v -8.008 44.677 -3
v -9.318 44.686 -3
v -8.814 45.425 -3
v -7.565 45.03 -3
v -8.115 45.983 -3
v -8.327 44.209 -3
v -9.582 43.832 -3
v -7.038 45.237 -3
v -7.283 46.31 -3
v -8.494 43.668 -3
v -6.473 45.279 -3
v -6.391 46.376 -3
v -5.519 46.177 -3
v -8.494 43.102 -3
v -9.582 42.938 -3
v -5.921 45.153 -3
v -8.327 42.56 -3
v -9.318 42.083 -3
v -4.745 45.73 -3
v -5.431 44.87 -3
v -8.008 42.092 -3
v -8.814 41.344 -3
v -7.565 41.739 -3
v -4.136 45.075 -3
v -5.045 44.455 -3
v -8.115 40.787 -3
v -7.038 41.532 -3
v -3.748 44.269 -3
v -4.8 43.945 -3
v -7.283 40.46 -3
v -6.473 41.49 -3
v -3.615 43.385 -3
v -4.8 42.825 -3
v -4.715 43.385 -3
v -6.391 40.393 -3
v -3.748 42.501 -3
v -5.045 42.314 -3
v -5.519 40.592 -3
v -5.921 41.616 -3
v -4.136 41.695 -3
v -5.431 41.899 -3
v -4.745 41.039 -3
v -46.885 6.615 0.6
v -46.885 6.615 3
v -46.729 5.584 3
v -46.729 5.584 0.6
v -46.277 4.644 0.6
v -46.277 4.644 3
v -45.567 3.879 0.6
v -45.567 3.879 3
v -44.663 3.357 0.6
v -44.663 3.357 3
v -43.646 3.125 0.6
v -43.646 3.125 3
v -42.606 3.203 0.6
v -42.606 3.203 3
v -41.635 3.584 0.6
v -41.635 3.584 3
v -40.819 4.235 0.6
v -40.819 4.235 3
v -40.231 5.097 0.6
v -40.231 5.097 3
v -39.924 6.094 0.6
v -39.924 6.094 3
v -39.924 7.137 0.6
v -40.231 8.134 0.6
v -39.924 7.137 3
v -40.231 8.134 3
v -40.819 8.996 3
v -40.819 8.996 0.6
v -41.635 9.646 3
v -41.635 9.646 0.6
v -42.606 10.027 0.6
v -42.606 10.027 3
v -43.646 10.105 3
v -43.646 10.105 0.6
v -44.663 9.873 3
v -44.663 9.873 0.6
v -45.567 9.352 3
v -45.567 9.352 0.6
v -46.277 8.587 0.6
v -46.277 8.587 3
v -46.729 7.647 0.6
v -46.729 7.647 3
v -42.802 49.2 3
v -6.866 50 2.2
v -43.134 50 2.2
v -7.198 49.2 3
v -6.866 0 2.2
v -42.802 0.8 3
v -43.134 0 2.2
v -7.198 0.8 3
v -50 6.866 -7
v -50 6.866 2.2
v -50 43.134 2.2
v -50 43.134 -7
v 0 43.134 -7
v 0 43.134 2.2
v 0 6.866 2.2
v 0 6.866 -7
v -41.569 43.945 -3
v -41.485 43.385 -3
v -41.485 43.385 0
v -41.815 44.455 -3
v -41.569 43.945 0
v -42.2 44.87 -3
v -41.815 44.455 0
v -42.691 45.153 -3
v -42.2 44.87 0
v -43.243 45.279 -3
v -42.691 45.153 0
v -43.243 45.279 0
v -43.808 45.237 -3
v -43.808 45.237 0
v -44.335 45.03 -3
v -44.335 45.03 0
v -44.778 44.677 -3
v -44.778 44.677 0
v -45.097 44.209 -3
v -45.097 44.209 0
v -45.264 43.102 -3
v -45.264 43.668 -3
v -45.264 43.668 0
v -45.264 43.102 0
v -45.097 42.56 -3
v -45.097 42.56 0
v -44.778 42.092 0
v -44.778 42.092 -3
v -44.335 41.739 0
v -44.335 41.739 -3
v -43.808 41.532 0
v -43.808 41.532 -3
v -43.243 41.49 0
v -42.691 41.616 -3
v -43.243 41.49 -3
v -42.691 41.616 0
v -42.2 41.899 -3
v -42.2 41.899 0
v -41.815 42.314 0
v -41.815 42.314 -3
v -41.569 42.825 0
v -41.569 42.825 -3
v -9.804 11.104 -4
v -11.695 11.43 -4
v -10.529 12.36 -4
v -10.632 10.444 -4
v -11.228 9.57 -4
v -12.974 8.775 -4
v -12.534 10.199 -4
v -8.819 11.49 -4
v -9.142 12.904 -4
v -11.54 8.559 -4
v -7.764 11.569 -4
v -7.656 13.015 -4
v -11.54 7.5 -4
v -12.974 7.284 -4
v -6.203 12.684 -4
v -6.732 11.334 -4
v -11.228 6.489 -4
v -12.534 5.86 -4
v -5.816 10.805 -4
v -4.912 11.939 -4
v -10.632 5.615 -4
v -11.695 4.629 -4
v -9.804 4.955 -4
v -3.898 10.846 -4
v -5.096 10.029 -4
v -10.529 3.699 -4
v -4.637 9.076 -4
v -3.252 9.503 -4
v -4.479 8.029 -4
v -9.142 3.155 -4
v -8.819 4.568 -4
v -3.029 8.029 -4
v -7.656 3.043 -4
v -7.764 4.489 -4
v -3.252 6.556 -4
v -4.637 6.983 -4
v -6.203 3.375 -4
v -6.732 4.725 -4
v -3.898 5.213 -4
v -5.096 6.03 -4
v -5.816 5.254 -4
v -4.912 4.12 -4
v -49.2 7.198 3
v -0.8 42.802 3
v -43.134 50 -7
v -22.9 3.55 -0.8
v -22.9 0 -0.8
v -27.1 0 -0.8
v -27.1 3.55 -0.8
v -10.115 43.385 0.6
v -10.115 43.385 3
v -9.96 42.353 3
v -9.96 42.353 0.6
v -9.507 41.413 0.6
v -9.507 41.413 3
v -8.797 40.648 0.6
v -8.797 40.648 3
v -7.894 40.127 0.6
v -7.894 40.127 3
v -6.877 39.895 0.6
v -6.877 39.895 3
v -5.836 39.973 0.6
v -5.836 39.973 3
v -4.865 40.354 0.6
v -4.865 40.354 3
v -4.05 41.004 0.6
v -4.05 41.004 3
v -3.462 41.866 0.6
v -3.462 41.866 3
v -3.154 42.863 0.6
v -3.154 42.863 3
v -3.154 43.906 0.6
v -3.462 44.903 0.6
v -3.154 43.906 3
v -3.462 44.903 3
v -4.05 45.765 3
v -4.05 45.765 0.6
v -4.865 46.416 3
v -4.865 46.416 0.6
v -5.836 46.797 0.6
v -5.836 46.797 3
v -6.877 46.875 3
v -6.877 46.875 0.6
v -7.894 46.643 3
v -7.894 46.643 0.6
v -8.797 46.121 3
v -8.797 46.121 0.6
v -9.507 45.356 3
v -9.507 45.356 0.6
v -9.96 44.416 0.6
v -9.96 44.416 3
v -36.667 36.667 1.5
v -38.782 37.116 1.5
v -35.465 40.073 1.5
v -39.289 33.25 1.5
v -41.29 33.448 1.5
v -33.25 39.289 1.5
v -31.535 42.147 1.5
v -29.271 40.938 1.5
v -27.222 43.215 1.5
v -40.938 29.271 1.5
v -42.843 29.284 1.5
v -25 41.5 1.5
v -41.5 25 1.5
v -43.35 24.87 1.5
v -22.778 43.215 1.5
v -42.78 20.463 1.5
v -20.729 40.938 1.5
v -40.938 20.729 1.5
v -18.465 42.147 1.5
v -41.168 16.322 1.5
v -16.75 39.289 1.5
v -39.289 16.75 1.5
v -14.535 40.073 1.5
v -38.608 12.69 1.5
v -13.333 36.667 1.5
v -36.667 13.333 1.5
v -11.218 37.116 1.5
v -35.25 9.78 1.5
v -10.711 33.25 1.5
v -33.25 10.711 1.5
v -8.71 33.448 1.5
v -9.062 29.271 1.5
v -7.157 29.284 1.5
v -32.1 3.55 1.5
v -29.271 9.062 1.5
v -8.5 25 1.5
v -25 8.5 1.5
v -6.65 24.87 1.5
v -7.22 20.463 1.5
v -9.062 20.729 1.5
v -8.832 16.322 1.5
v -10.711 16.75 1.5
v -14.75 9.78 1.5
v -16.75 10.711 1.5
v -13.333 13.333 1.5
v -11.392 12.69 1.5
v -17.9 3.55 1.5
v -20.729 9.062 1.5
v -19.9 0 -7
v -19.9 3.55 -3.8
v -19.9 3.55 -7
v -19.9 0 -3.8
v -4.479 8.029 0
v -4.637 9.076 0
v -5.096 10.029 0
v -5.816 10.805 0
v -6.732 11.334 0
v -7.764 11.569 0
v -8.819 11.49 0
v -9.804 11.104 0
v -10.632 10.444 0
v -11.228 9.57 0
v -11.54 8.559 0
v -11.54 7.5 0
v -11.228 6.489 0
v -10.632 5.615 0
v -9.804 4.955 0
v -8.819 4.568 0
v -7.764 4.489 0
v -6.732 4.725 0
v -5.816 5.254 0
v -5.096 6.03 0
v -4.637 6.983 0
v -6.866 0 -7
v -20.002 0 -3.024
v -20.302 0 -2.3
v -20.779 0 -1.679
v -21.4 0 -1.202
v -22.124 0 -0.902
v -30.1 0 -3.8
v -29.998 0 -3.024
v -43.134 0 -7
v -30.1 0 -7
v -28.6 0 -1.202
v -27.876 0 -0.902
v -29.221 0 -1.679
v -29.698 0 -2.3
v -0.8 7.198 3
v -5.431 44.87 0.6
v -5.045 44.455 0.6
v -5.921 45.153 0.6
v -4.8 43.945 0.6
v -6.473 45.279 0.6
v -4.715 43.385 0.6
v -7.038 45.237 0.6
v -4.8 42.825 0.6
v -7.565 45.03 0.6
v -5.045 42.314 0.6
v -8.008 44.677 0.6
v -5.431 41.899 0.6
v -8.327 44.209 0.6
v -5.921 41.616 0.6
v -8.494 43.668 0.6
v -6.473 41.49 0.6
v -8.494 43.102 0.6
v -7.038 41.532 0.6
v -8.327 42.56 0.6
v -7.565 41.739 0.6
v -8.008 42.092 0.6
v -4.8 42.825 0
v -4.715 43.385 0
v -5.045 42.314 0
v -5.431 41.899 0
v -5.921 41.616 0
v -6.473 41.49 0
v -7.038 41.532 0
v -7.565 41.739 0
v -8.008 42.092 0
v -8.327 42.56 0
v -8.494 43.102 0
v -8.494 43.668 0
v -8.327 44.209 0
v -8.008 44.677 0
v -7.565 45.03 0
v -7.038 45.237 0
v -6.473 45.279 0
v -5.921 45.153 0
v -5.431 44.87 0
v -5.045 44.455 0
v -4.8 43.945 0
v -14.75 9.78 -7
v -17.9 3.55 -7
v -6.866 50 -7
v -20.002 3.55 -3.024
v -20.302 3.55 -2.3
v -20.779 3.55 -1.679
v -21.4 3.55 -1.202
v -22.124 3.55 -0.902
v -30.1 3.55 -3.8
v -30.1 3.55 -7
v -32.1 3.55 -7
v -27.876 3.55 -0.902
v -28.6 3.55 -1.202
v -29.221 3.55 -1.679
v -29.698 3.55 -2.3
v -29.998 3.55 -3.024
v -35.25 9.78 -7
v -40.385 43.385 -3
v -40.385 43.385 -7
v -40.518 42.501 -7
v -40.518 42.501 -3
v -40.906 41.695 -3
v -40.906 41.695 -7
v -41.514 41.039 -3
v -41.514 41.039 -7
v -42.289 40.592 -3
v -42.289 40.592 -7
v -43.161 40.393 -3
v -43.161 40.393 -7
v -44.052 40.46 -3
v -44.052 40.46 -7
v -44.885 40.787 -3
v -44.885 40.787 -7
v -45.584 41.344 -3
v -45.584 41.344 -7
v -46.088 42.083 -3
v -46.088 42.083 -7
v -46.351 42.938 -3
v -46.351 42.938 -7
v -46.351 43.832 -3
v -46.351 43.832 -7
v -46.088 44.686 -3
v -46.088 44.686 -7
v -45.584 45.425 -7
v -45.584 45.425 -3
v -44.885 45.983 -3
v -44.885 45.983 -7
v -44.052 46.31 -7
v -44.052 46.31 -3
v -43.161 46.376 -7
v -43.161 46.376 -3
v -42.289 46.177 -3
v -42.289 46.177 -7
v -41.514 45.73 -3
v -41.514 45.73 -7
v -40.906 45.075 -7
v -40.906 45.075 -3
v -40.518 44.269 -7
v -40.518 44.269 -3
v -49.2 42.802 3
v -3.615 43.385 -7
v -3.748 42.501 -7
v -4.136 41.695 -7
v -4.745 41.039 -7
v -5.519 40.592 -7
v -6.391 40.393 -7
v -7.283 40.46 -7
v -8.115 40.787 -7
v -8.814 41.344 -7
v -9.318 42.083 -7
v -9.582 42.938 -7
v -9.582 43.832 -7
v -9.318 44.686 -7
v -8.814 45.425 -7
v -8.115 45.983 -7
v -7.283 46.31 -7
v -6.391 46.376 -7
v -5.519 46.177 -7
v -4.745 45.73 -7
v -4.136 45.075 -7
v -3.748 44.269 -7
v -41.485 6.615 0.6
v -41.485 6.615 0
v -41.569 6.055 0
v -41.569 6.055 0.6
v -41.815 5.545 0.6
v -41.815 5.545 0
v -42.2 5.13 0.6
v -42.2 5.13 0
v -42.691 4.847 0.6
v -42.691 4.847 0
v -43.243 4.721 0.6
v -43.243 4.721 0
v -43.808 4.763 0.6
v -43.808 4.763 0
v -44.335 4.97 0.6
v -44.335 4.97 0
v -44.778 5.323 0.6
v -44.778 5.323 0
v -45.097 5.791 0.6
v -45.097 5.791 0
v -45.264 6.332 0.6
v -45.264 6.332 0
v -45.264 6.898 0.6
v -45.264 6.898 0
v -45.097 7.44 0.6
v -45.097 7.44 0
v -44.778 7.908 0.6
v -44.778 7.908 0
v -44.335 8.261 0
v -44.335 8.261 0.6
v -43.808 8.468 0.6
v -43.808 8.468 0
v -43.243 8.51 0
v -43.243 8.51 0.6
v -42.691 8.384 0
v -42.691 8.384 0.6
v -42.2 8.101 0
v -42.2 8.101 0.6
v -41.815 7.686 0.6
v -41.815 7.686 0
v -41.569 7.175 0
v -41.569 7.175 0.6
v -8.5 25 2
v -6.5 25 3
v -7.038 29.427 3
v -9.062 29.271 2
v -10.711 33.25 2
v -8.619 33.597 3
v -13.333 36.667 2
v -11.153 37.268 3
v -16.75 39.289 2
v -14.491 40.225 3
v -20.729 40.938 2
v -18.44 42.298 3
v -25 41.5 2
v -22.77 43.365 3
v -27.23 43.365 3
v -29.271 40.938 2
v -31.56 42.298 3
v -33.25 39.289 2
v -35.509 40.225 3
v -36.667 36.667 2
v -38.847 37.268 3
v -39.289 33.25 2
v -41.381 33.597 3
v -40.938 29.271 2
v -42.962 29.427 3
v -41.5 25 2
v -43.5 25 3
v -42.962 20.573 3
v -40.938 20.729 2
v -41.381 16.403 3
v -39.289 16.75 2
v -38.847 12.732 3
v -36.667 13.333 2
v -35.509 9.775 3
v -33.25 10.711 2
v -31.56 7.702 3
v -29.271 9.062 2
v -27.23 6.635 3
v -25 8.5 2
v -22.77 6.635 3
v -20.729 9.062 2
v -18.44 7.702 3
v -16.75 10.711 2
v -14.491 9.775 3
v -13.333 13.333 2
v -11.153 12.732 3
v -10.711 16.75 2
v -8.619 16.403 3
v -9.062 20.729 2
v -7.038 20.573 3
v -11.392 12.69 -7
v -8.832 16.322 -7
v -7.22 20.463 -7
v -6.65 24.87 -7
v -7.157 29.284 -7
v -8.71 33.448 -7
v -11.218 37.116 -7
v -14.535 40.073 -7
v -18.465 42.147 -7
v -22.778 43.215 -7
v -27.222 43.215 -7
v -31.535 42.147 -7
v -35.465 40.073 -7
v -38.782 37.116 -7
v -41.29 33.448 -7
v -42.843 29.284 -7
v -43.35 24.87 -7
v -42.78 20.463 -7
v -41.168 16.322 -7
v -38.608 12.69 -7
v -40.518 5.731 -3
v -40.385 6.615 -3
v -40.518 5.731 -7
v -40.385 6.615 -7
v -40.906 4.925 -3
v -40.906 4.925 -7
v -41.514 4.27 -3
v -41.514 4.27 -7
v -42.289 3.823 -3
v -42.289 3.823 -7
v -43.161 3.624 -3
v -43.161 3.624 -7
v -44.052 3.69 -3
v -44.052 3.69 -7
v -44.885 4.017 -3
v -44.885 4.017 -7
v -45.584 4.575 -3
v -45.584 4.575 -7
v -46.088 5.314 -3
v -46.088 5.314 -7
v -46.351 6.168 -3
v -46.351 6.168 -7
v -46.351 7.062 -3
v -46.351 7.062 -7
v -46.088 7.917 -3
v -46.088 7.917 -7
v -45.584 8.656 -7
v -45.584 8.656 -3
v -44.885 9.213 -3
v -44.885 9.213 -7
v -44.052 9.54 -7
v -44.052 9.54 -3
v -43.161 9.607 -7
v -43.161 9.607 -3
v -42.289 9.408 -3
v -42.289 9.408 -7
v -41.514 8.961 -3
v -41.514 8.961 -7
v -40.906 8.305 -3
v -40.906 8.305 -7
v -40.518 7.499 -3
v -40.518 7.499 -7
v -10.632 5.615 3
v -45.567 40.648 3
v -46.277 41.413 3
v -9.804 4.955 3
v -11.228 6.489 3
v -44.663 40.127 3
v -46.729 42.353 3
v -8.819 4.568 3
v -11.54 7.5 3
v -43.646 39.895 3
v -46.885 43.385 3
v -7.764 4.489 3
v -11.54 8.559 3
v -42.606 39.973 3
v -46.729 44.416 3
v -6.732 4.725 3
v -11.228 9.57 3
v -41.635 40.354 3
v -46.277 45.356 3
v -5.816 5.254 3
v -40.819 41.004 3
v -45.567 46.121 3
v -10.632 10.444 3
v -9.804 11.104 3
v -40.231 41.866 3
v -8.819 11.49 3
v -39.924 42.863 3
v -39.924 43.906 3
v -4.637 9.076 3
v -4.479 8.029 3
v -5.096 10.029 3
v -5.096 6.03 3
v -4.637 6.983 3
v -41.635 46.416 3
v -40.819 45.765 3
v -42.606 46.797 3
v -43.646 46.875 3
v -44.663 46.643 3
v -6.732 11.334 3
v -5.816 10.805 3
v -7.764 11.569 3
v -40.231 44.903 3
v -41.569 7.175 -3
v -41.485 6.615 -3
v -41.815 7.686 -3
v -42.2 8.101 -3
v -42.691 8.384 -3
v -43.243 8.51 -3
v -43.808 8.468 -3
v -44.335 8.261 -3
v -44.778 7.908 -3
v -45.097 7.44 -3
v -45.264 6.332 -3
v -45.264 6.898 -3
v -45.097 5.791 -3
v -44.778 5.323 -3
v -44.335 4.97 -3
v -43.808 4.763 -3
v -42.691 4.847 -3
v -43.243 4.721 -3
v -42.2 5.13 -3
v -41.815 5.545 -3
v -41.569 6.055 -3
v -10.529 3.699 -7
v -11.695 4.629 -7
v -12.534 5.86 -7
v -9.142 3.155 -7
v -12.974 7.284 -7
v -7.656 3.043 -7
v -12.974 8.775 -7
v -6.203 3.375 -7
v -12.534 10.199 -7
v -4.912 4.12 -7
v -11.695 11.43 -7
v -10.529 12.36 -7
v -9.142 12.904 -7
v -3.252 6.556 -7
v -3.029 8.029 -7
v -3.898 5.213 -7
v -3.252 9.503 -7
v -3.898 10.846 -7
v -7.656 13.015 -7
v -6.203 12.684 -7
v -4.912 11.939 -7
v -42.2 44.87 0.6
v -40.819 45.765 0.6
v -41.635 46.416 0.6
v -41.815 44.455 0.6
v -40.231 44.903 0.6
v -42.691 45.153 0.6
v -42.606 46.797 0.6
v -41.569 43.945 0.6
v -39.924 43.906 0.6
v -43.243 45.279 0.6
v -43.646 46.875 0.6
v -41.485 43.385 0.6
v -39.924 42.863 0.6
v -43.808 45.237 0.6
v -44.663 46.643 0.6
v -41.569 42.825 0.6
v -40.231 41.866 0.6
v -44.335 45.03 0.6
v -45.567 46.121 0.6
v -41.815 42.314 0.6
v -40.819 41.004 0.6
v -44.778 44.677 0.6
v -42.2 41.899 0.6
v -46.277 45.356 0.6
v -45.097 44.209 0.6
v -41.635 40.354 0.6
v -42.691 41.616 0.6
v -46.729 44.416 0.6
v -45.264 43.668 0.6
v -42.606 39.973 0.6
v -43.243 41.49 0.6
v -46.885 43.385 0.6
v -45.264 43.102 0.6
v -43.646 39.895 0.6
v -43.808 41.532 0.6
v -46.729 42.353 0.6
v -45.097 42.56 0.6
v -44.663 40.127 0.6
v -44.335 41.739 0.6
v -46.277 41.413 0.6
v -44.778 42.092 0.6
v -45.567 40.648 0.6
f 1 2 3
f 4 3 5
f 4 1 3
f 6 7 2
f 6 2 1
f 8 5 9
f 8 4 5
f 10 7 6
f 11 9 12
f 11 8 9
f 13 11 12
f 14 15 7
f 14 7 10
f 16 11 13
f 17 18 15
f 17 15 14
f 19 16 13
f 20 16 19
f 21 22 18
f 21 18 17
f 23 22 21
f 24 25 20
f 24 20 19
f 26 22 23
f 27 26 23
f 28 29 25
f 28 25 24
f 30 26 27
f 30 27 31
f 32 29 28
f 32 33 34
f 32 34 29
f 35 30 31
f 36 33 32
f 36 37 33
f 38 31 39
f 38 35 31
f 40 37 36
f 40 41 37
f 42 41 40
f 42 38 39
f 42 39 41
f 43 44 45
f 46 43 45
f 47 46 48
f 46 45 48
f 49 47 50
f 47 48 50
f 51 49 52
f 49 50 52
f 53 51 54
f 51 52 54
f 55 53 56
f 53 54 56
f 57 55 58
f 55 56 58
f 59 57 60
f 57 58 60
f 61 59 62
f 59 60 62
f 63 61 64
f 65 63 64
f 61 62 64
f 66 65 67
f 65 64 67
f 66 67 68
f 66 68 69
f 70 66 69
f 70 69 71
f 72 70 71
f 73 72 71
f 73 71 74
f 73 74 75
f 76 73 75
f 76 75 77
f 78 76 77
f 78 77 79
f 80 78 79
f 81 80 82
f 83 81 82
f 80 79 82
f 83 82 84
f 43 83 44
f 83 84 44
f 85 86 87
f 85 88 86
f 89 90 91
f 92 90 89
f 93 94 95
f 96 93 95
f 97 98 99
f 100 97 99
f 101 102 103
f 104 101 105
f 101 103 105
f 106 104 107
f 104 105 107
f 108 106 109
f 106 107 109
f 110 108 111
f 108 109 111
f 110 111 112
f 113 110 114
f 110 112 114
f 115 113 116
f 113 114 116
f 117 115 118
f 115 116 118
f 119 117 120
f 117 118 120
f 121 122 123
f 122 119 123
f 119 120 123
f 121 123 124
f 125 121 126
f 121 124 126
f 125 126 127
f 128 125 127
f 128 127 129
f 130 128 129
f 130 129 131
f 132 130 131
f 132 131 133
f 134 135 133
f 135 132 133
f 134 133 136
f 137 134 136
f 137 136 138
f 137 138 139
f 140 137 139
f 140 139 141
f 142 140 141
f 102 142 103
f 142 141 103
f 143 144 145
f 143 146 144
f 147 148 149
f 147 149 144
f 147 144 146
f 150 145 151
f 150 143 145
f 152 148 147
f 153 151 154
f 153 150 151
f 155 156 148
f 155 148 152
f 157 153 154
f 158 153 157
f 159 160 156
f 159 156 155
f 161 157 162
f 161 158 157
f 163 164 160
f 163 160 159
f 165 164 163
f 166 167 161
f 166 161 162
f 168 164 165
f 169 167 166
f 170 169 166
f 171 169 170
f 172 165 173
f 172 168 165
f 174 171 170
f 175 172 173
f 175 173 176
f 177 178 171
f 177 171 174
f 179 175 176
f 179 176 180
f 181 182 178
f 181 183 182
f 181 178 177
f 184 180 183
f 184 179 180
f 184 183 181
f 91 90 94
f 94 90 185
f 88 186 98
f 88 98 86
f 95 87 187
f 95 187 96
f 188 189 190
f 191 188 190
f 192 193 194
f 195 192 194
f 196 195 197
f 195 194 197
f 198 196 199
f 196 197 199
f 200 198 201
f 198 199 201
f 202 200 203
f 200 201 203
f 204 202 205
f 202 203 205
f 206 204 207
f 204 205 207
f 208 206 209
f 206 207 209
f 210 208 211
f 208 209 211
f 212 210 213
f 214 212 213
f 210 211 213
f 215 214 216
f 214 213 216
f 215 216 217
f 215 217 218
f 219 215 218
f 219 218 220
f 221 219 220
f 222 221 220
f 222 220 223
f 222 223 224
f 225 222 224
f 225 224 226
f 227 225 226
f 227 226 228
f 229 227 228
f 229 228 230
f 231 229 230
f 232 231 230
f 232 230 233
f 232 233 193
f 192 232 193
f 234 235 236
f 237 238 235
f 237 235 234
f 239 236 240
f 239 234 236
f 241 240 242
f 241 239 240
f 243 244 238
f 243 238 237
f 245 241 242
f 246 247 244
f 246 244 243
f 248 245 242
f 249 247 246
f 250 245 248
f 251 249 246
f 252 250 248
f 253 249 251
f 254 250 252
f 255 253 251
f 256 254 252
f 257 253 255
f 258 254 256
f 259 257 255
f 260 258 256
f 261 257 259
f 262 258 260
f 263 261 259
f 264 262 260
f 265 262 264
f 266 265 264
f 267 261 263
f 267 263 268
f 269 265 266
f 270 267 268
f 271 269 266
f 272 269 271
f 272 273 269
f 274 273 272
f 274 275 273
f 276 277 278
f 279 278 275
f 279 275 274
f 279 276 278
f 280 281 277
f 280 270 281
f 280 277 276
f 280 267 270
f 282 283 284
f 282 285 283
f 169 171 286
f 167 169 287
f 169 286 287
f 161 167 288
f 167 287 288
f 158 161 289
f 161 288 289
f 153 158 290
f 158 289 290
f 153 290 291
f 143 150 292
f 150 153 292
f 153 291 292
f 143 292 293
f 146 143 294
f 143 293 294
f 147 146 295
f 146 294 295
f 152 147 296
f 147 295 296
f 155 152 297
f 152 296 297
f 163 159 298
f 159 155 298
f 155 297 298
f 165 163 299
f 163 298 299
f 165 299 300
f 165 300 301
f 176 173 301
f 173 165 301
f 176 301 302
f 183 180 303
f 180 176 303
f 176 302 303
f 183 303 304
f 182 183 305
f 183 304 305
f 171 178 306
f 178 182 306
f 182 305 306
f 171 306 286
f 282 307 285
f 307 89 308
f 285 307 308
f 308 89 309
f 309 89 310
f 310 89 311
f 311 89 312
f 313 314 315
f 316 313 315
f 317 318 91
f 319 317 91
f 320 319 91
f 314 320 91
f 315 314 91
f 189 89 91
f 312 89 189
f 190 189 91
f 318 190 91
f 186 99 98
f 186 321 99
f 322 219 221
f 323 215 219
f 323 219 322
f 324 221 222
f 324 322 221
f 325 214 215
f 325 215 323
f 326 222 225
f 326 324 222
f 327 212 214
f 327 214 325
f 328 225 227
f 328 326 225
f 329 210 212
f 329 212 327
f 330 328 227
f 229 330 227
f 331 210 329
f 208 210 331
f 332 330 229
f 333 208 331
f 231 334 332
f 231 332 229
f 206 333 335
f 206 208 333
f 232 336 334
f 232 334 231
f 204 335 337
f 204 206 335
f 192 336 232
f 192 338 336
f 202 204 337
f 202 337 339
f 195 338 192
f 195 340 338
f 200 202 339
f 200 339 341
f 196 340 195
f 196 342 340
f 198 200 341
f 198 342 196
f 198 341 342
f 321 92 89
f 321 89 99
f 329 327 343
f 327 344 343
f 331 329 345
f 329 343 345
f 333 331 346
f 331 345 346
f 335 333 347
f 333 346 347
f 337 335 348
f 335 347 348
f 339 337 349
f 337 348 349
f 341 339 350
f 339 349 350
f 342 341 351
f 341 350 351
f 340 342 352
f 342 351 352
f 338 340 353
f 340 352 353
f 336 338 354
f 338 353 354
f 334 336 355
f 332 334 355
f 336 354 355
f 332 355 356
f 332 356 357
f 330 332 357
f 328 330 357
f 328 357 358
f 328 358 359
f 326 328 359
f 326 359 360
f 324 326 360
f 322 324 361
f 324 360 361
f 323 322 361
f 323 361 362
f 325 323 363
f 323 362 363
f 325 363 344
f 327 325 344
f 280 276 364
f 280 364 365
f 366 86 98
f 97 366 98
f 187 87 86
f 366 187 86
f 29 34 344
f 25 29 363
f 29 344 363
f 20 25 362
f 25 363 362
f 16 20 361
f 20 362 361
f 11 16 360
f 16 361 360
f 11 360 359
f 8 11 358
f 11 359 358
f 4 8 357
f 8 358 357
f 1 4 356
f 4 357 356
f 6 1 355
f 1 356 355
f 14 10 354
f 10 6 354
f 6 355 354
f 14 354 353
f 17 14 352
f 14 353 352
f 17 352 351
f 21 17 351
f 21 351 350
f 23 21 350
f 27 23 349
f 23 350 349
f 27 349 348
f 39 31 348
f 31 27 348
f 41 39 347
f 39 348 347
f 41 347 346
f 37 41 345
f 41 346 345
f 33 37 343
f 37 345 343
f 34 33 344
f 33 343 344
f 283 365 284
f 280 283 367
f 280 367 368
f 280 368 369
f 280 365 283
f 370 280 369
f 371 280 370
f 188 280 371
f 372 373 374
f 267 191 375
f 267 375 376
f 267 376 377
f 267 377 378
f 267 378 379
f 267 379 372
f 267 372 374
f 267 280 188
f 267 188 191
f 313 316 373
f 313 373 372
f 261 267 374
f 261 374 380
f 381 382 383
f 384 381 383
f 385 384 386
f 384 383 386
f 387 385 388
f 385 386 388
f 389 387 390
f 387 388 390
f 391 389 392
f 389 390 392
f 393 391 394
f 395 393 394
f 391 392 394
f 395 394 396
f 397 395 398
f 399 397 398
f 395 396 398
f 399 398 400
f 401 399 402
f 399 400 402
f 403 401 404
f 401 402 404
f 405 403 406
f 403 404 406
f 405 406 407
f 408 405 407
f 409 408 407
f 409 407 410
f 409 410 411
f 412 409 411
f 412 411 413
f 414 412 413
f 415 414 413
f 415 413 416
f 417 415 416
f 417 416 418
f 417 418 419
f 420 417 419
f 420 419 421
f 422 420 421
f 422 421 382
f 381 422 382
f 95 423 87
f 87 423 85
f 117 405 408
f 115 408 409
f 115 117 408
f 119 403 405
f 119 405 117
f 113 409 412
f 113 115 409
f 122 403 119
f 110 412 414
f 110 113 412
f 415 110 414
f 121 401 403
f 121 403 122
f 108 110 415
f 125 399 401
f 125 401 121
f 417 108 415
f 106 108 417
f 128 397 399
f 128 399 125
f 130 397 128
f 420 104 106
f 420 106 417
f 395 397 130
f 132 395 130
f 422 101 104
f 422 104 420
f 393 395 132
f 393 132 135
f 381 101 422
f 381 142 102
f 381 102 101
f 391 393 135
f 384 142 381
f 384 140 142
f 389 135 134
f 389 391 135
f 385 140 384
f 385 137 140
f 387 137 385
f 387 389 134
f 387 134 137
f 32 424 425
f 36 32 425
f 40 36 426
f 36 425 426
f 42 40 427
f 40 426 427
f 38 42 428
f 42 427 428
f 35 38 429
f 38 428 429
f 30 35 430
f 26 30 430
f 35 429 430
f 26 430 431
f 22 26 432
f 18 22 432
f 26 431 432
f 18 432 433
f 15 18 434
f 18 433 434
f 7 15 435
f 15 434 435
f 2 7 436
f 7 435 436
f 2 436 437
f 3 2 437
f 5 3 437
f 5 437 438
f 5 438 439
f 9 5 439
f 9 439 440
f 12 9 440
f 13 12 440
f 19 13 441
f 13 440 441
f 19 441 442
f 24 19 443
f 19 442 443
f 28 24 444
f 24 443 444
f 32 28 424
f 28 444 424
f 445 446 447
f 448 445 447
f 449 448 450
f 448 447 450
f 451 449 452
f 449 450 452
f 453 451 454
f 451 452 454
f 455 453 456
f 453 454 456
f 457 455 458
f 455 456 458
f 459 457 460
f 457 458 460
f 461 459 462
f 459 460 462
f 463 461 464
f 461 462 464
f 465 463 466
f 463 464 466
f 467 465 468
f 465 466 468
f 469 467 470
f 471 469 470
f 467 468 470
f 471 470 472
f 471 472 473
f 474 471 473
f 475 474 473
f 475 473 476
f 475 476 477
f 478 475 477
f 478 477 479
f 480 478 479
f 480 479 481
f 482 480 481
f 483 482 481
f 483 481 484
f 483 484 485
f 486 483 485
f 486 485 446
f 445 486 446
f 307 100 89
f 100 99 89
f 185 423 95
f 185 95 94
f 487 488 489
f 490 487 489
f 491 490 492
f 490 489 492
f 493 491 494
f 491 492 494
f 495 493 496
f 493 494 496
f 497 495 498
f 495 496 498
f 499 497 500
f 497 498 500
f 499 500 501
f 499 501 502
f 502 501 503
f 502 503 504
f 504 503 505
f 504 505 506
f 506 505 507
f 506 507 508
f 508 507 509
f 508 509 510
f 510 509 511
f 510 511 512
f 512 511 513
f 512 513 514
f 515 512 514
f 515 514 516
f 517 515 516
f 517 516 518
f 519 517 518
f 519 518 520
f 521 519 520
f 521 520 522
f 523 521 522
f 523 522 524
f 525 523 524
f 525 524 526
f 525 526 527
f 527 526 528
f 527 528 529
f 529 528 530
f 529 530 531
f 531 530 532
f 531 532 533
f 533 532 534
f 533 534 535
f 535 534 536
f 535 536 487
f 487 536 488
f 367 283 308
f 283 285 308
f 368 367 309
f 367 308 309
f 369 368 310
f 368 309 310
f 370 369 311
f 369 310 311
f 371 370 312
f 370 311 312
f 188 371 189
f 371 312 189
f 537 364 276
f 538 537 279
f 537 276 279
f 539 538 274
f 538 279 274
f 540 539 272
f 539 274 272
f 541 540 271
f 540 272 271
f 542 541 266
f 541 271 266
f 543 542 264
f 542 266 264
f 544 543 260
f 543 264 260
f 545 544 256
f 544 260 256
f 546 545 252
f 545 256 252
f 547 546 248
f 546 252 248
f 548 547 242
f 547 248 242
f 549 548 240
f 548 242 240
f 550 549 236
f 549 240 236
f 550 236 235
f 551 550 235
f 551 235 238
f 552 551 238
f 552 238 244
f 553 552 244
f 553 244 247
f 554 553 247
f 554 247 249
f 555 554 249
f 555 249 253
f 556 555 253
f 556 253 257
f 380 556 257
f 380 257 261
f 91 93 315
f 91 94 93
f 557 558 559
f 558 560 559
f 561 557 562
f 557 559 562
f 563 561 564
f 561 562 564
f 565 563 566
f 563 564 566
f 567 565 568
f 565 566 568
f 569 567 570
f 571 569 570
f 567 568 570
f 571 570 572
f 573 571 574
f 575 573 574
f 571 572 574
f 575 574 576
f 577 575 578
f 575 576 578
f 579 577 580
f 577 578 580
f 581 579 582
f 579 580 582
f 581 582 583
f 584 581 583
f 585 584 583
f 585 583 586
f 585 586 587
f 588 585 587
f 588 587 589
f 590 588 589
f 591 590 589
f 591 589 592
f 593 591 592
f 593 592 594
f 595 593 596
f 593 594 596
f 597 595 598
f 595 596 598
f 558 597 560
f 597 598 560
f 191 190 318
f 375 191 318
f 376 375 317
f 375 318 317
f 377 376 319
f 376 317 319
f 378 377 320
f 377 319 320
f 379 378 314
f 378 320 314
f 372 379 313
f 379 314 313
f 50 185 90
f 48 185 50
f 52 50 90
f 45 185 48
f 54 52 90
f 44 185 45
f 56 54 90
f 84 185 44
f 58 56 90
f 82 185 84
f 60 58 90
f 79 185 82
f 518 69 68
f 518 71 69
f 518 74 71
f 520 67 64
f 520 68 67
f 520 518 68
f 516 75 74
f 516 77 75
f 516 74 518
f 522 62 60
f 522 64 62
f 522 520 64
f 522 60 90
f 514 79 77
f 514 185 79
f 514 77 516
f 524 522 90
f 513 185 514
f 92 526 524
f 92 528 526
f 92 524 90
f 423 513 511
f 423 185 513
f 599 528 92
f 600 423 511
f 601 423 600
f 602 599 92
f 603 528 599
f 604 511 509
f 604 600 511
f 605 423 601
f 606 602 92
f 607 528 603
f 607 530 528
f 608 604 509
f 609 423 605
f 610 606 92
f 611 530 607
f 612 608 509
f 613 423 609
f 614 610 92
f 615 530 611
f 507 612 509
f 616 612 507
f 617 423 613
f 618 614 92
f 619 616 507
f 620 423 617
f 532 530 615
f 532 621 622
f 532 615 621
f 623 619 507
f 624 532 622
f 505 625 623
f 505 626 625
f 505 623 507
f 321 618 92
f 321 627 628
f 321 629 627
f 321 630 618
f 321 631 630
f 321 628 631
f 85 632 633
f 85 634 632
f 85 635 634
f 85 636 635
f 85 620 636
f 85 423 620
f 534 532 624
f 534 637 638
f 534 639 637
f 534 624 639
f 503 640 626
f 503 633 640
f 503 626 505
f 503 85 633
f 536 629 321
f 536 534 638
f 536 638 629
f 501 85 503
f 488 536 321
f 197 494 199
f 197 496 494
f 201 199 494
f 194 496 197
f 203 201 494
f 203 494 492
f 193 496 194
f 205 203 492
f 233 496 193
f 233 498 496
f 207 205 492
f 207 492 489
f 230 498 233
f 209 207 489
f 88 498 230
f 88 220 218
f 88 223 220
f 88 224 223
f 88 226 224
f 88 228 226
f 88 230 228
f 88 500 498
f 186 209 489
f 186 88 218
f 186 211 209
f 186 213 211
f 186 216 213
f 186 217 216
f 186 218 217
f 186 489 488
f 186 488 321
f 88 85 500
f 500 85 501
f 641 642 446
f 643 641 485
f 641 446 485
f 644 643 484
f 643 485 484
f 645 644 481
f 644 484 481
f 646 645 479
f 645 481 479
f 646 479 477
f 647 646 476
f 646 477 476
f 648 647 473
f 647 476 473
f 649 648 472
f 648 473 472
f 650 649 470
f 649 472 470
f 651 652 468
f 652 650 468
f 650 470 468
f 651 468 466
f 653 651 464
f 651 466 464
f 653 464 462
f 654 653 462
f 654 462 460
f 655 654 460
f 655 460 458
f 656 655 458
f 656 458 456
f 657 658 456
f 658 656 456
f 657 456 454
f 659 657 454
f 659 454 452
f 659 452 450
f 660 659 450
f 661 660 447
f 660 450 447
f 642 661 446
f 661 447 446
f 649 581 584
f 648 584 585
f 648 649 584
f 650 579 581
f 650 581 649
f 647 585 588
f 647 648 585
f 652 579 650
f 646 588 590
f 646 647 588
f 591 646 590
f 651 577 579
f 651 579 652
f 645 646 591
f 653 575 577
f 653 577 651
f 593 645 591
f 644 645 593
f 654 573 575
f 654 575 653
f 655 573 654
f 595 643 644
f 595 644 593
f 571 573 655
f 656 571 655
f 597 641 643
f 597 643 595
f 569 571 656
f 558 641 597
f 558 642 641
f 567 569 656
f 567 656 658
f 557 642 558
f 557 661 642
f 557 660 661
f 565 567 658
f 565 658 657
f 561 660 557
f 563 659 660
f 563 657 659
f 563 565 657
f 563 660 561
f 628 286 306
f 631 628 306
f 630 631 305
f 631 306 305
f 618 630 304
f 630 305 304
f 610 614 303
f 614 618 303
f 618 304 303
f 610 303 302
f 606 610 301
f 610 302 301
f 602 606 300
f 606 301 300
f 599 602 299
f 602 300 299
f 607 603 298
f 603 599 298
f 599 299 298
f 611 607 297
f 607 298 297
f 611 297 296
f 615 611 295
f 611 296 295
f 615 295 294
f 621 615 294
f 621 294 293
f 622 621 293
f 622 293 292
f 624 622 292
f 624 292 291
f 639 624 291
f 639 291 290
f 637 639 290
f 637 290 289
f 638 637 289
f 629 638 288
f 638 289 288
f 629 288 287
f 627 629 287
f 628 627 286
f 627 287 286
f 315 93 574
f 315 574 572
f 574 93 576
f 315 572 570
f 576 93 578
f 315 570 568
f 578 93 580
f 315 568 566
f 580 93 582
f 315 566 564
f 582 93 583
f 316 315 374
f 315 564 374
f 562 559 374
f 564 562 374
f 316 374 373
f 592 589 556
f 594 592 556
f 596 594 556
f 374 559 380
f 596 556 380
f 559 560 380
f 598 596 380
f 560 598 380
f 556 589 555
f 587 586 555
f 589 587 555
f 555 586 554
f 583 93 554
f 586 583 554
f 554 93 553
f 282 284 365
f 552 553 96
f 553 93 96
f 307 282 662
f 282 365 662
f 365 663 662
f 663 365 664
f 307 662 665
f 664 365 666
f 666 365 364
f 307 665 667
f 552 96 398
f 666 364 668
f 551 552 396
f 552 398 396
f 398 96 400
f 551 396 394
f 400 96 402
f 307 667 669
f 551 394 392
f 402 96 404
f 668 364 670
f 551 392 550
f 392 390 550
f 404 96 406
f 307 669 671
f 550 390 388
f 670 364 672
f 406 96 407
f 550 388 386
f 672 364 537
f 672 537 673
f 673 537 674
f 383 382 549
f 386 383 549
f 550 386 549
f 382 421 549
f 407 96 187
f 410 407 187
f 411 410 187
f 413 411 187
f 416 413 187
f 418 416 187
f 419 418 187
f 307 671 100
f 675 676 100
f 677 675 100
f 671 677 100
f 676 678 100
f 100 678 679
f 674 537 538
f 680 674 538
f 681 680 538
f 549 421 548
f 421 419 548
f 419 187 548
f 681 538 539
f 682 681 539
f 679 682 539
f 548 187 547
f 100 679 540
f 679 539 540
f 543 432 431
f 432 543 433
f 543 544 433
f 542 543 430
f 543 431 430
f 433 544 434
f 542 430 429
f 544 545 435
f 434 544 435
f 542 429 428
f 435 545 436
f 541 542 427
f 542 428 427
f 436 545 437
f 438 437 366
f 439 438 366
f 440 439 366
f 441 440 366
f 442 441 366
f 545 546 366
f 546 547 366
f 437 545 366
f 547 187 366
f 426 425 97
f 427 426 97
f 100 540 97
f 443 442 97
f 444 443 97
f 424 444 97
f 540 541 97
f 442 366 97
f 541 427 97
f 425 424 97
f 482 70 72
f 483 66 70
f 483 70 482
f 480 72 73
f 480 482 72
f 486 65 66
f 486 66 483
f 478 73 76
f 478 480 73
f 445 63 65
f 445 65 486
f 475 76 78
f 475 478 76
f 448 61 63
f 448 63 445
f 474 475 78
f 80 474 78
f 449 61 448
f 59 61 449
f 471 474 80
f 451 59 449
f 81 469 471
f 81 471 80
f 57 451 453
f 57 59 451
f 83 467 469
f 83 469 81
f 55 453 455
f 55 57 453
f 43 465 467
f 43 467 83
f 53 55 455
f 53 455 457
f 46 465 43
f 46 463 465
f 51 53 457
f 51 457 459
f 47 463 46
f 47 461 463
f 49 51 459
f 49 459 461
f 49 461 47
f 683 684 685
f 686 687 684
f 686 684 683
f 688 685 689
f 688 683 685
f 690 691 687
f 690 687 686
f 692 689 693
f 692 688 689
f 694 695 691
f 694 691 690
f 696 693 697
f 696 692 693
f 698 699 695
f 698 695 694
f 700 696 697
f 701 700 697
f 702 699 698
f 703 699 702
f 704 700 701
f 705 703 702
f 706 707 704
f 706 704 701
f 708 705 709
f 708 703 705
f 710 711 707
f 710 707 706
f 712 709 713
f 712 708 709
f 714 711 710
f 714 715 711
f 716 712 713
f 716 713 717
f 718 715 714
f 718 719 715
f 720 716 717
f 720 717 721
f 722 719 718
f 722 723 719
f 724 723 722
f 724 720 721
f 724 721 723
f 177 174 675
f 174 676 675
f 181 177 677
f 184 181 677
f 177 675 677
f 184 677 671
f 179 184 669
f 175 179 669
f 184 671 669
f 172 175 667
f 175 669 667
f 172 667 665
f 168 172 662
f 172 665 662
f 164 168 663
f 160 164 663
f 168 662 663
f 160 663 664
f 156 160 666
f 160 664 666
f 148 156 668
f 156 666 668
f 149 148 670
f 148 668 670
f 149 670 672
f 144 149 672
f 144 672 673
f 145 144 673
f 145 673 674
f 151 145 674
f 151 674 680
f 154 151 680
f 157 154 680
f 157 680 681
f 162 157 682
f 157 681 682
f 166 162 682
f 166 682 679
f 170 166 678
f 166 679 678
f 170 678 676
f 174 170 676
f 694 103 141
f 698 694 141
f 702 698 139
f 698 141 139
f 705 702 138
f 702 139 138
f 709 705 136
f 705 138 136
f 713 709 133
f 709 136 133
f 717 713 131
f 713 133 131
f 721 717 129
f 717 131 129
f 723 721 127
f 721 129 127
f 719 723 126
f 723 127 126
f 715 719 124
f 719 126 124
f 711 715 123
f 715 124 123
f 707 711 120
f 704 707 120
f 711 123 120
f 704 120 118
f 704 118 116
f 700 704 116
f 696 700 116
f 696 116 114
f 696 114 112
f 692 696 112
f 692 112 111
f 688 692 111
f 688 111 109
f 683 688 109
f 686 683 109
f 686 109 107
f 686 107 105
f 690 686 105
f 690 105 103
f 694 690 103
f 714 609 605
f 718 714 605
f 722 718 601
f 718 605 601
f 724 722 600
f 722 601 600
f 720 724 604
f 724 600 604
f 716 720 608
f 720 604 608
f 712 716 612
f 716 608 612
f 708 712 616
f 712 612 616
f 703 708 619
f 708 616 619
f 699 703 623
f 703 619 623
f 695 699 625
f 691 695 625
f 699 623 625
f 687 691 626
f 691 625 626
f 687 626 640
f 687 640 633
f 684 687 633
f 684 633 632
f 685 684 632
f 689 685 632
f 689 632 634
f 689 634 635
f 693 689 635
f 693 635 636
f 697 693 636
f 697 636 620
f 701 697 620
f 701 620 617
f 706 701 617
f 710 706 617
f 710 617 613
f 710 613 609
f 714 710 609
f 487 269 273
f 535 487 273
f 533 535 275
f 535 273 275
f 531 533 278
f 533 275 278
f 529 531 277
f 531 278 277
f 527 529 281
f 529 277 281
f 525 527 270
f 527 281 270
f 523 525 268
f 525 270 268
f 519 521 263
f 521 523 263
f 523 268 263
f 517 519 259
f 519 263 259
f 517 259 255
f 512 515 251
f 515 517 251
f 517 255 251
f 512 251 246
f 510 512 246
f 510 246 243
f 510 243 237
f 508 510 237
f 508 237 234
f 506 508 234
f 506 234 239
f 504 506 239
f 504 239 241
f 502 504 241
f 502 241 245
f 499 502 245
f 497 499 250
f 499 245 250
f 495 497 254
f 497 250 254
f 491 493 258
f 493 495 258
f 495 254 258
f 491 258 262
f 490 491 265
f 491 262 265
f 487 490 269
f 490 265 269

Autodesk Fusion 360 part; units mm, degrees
sketch "Skizze1" plane through (0, 0, 0) normal (0, 0, 1) x (1, 0, 0)
  line L0 (-50, 50) -> (0, 50)
  line L1 (0, 50) -> (0, 0)
  line L2 (0, 0) -> (-50, 0)
  line L3 (-50, 0) -> (-50, 50)
  line L4 (-50, 25) -> (0, 25) construction
  line L5 (-25, 50) -> (-25, 0) construction
  circle A0 centre (-25, 25) radius 16.5
  circle A1 centre (-8.0294, 8.0294) radius 3.55
  line L6 (-50, 50) -> (0, 0) construction
  line L7 (0, 50) -> (-50, 0) construction
  circle A2 centre (-43.3848, 43.3848) radius 1.9
  circle A3 centre (-6.6152, 43.3848) radius 1.9
  circle A4 centre (-43.3848, 6.6152) radius 1.9
  line L8 (-6.8665, 50) -> (0, 43.1335)
  line L9 (-50, 6.8665) -> (-43.1335, 0)
  line L10 (-43.1335, 50) -> (-50, 43.1335)
  line L11 (0, 6.8665) -> (-6.8665, 0)
  line L12 (-8.0294, 16.5147) -> (-16.5147, 8.0294) construction
  line L13 (-16.5147, 8.0294) -> (-8.0294, -0.4558) construction
  line L14 (-8.0294, -0.4558) -> (0.4558, 8.0294) construction
  line L15 (0.4558, 8.0294) -> (-8.0294, 16.5147) construction
  line L16 (-8.0294, 16.5147) -> (-8.0294, -0.4558) construction
  point P0 (-8.0294, 8.0294)
  point P1 (-8.0294, 8.0294)
  dimension "d3" = 33
  dimension "d4" = 7.1
  dimension "d6" = 3.8
  dimension "d7" = 26
  dimension "d8" = 26
  dimension "d9" = 26
  dimension "d42" = 50
  dimension "d43" = 50
  dimension "d44" = 61
  dimension "d45" = 61
  dimension "d46" = 12
  dimension "d47" = 12
  dimension "d54" = 6.5
extrude "Extrusion1" add sketch "Skizze1" along normal blind 3 contours L0 L1 L2 L3 L8 L9 L10 L11
chamfer "Fase1" distance 0.8 angle 45 8 edges at (-25, 0, 3) (-46.5668, 3.4332, 3) (-50, 25, 3) (-46.5668, 46.5668, 3) (-25, 50, 3) (-3.4332, 46.5668, 3) (0, 25, 3) (-3.4332, 3.4332, 3)
chamfer "Fase3" distance 2 distance2 1 1 edges at (-40.3834, 30.9667, 3) measured on face at (-24.589, 46.618, 3)
sketch "Skizze2" plane through (0, 0, 0) normal (0, 0, -1) x (1, 0, 0)
  circle A0 centre (-25, -25) radius 16.5
  circle A1 centre (-43.3848, -43.3848) radius 1.9
  circle A2 centre (-43.3848, -6.6152) radius 1.9
  circle A3 centre (-8.0294, -8.0294) radius 3.55
  circle A4 centre (-6.6152, -43.3848) radius 1.9
  line L0 (-50, -43.1335) -> (-43.1335, -50)
  line L1 (-43.1335, -50) -> (-6.8665, -50)
  line L2 (-6.8665, -50) -> (0, -43.1335)
  line L3 (0, -43.1335) -> (0, -6.8665)
  line L4 (0, -6.8665) -> (-6.8665, 0)
  line L5 (-6.8665, 0) -> (-43.1335, 0)
  line L6 (-43.1335, 0) -> (-50, -6.8665)
  line L7 (-50, -6.8665) -> (-50, -43.1335)
  circle A5 centre (-25, -25) radius 18.35
  line L8 (-14.75, -9.7796) -> (-17.9, -3.55)
  line L9 (-17.9, -3.55) -> (-32.1, -3.55)
  line L10 (-32.1, -3.55) -> (-35.25, -9.7796)
  line L11 (-25, -25) -> (-25, 4.0219) construction
  dimension "d18" = 36.7
  dimension "d19" = 21.45
  dimension "d20" = 20.5
  dimension "d21" = 14.2
extrude "Extrusion2" cut sketch "Skizze2" against normal blind 1.5 contours A5 | A5 L8 L9 L10
sketch "Skizze3" plane through (0, 0, 0) normal (0, -1, 0) x (1, 0, 0)
  line L0 (-6.8665, 2.2) -> (-43.1335, 2.2)
  line L1 (-43.1335, 2.2) -> (-43.1335, 0)
  line L2 (-43.1335, 0) -> (-6.8665, 0)
  line L3 (-6.8665, 0) -> (-6.8665, 2.2)
  line L4 (-41.5, 1.5) -> (-8.5, 1.5)
  line L5 (-41.5, 2) -> (-8.5, 2)
  line L6 (-25, 1.5) -> (-25, -10) construction
  line L7 (-22.9, -6.8) -> (-27.1, -6.8)
  line L8 (-22.9, -0.8) -> (-27.1, -0.8)
  arc A0 (-27.1, -0.8) -> (-27.1, -6.8) centre (-27.1, -3.8) ccw
  arc A1 (-22.9, -6.8) -> (-22.9, -0.8) centre (-22.9, -3.8) ccw
  line L9 (-19.9, -3.8) -> (-30.1, -3.8) construction
  line L10 (-25, -5.5) -> (-25, -2.1) construction
  line L11 (-22.9, -6.8) -> (-19.9, -6.8)
  line L12 (-19.9, -6.8) -> (-19.9, -3.8)
  line L13 (-27.1, -6.8) -> (-30.1, -6.8)
  line L14 (-30.1, -6.8) -> (-30.1, -3.8)
  line L15 (-30.1, -6.8) -> (-19.9, -6.8)
  line L16 (-19.9, -6.8) -> (-19.9, -8.8)
  line L17 (-19.9, -8.8) -> (-30.1, -8.8)
  line L18 (-30.1, -8.8) -> (-30.1, -6.8)
  point P0 (-25, -2.1)
  point P1 (-25, -5.5)
  point P2 (-25, -3.8)
  point P3 (-25, -3.8)
  dimension "d24" = 3.6
  dimension "d25" = 7
  dimension "d27" = 6
  dimension "d31" = 10.2
  dimension "d53" = 2
extrude "Extrusion3" add 1 faces at (-47.7677, 25.4366, 0) along direction (0, 0, -1) blind 7
extrude "Extrusion4" cut sketch "Skizze3" against normal up to surface (3.55 mm away) contours L7 L11 L13 L15 L16 L17 L18 | L7 L8 A0 A1 L15 | A1 L11 L12 L15 | A0 L13 L14 L15
sketch "Skizze4" plane through (0, 0, -7) normal (0, 0, -1) x (1, 0, 0)
  circle A0 centre (-43.3848, -43.3848) radius 1.9
  circle A1 centre (-6.6152, -43.3848) radius 1.9
  arc A2 (-35.25, -9.7796) -> (-14.75, -9.7796) centre (-25, -25) ccw
  arc A3 (-35.25, -9.7796) -> (-14.75, -9.7796) centre (-25, -25) ccw
  circle A4 centre (-8.0294, -8.0294) radius 3.55
  circle A5 centre (-8.0294, -8.0294) radius 3.55
  circle A6 centre (-43.3848, -6.6152) radius 1.9
  circle A7 centre (-8.0294, -8.0294) radius 3.5
  circle A8 centre (-8.0294, -8.0294) radius 5
  circle A9 centre (-6.6152, -43.3848) radius 1.1
  circle A10 centre (-6.6152, -43.3848) radius 3
  circle A11 centre (-43.3848, -43.3848) radius 1.1
  circle A12 centre (-43.3848, -43.3848) radius 3
  circle A13 centre (-43.3848, -6.6152) radius 1.1
  circle A14 centre (-43.3848, -6.6152) radius 3
  circle A15 centre (-43.3848, -43.3848) radius 1.9
  circle A16 centre (-6.6152, -43.3848) radius 1.9
  circle A17 centre (-43.3848, -6.6152) radius 1.9
  dimension "d49" = 6
  dimension "d50" = 10
extrude "Extrusion5" cut sketch "Skizze4" against normal blind 4 contours A10 | A12 | A14
extrude "Extrusion6" cut sketch "Skizze4" against normal blind 3 contours A8
sketch "Skizze5" plane through (0, 0, 3) normal (0, 0, 1) x (-1, 0, 0)
  line L0 (7.1979, -49.2) -> (42.8021, -49.2)
  line L1 (42.8021, -49.2) -> (49.2, -42.8021)
  line L2 (49.2, -42.8021) -> (49.2, -7.1979)
  line L3 (49.2, -7.1979) -> (42.8021, -0.8)
  line L4 (42.8021, -0.8) -> (7.1979, -0.8)
  line L5 (7.1979, -0.8) -> (0.8, -7.1979)
  line L6 (0.8, -7.1979) -> (0.8, -42.8021)
  line L7 (0.8, -42.8021) -> (7.1979, -49.2)
  circle A0 centre (43.3848, -43.3848) radius 1.9
  circle A1 centre (43.3848, -6.6152) radius 1.9
  circle A2 centre (6.6152, -43.3848) radius 1.9
  circle A3 centre (8.0294, -8.0294) radius 3.55
  circle A4 centre (25, -25) radius 18.5
  circle A5 centre (6.6152, -43.3848) radius 1.9
  circle A6 centre (6.6152, -43.3848) radius 1.9
  circle A7 centre (43.3848, -43.3848) radius 1.9
  circle A8 centre (43.3848, -43.3848) radius 1.9
  circle A9 centre (43.3848, -6.6152) radius 1.9
  circle A10 centre (43.3848, -6.6152) radius 1.9
  circle A11 centre (43.3848, -43.3848) radius 3.5
  circle A12 centre (43.3848, -6.6152) radius 3.5
  circle A13 centre (6.6152, -43.3848) radius 3.5
  dimension "d55" = 7
extrude "Extrusion7" cut sketch "Skizze5" against normal blind 2.4 contours A11 | A12 | A13
sketch "Skizze6" plane through (0, 0, -7) normal (0, 0, -1) x (1, 0, 0)
  circle A0 centre (-8.0294, -8.0294) radius 5
  line L0 (-30.1, -3.55) -> (-30.1, 0)
  line L1 (-30.1, 0) -> (-43.1335, 0)
  line L2 (-43.1335, 0) -> (-50, -6.8665)
  line L3 (-50, -6.8665) -> (-50, -43.1335)
  line L4 (-50, -43.1335) -> (-43.1335, -50)
  line L5 (-43.1335, -50) -> (-6.8665, -50)
  line L6 (-6.8665, -50) -> (0, -43.1335)
  line L7 (0, -43.1335) -> (0, -6.8665)
  line L8 (0, -6.8665) -> (-6.8665, 0)
  line L9 (-6.8665, 0) -> (-19.9, 0)
  line L10 (-19.9, 0) -> (-19.9, -3.55)
  line L11 (-19.9, -3.55) -> (-17.9, -3.55)
  line L12 (-17.9, -3.55) -> (-14.75, -9.7796)
  arc A1 (-35.25, -9.7796) -> (-14.75, -9.7796) centre (-25, -25) ccw
  line L13 (-35.25, -9.7796) -> (-32.1, -3.55)
  line L14 (-32.1, -3.55) -> (-30.1, -3.55)
  circle A2 centre (-6.6152, -43.3848) radius 3
  circle A3 centre (-43.3848, -43.3848) radius 3
  circle A4 centre (-43.3848, -6.6152) radius 3
  circle A5 centre (-6.6152, -43.3848) radius 3
  circle A6 centre (-43.3848, -43.3848) radius 3
  circle A7 centre (-43.3848, -6.6152) radius 3
  circle A8 centre (-8.0294, -8.0294) radius 5
  circle A9 centre (-25, -25) radius 19.5
  dimension "d58" = 39
equation "d8 = d7"
equation "d9 = d7"
equation "d54 = 6.85 mm - 0.35 mm"
